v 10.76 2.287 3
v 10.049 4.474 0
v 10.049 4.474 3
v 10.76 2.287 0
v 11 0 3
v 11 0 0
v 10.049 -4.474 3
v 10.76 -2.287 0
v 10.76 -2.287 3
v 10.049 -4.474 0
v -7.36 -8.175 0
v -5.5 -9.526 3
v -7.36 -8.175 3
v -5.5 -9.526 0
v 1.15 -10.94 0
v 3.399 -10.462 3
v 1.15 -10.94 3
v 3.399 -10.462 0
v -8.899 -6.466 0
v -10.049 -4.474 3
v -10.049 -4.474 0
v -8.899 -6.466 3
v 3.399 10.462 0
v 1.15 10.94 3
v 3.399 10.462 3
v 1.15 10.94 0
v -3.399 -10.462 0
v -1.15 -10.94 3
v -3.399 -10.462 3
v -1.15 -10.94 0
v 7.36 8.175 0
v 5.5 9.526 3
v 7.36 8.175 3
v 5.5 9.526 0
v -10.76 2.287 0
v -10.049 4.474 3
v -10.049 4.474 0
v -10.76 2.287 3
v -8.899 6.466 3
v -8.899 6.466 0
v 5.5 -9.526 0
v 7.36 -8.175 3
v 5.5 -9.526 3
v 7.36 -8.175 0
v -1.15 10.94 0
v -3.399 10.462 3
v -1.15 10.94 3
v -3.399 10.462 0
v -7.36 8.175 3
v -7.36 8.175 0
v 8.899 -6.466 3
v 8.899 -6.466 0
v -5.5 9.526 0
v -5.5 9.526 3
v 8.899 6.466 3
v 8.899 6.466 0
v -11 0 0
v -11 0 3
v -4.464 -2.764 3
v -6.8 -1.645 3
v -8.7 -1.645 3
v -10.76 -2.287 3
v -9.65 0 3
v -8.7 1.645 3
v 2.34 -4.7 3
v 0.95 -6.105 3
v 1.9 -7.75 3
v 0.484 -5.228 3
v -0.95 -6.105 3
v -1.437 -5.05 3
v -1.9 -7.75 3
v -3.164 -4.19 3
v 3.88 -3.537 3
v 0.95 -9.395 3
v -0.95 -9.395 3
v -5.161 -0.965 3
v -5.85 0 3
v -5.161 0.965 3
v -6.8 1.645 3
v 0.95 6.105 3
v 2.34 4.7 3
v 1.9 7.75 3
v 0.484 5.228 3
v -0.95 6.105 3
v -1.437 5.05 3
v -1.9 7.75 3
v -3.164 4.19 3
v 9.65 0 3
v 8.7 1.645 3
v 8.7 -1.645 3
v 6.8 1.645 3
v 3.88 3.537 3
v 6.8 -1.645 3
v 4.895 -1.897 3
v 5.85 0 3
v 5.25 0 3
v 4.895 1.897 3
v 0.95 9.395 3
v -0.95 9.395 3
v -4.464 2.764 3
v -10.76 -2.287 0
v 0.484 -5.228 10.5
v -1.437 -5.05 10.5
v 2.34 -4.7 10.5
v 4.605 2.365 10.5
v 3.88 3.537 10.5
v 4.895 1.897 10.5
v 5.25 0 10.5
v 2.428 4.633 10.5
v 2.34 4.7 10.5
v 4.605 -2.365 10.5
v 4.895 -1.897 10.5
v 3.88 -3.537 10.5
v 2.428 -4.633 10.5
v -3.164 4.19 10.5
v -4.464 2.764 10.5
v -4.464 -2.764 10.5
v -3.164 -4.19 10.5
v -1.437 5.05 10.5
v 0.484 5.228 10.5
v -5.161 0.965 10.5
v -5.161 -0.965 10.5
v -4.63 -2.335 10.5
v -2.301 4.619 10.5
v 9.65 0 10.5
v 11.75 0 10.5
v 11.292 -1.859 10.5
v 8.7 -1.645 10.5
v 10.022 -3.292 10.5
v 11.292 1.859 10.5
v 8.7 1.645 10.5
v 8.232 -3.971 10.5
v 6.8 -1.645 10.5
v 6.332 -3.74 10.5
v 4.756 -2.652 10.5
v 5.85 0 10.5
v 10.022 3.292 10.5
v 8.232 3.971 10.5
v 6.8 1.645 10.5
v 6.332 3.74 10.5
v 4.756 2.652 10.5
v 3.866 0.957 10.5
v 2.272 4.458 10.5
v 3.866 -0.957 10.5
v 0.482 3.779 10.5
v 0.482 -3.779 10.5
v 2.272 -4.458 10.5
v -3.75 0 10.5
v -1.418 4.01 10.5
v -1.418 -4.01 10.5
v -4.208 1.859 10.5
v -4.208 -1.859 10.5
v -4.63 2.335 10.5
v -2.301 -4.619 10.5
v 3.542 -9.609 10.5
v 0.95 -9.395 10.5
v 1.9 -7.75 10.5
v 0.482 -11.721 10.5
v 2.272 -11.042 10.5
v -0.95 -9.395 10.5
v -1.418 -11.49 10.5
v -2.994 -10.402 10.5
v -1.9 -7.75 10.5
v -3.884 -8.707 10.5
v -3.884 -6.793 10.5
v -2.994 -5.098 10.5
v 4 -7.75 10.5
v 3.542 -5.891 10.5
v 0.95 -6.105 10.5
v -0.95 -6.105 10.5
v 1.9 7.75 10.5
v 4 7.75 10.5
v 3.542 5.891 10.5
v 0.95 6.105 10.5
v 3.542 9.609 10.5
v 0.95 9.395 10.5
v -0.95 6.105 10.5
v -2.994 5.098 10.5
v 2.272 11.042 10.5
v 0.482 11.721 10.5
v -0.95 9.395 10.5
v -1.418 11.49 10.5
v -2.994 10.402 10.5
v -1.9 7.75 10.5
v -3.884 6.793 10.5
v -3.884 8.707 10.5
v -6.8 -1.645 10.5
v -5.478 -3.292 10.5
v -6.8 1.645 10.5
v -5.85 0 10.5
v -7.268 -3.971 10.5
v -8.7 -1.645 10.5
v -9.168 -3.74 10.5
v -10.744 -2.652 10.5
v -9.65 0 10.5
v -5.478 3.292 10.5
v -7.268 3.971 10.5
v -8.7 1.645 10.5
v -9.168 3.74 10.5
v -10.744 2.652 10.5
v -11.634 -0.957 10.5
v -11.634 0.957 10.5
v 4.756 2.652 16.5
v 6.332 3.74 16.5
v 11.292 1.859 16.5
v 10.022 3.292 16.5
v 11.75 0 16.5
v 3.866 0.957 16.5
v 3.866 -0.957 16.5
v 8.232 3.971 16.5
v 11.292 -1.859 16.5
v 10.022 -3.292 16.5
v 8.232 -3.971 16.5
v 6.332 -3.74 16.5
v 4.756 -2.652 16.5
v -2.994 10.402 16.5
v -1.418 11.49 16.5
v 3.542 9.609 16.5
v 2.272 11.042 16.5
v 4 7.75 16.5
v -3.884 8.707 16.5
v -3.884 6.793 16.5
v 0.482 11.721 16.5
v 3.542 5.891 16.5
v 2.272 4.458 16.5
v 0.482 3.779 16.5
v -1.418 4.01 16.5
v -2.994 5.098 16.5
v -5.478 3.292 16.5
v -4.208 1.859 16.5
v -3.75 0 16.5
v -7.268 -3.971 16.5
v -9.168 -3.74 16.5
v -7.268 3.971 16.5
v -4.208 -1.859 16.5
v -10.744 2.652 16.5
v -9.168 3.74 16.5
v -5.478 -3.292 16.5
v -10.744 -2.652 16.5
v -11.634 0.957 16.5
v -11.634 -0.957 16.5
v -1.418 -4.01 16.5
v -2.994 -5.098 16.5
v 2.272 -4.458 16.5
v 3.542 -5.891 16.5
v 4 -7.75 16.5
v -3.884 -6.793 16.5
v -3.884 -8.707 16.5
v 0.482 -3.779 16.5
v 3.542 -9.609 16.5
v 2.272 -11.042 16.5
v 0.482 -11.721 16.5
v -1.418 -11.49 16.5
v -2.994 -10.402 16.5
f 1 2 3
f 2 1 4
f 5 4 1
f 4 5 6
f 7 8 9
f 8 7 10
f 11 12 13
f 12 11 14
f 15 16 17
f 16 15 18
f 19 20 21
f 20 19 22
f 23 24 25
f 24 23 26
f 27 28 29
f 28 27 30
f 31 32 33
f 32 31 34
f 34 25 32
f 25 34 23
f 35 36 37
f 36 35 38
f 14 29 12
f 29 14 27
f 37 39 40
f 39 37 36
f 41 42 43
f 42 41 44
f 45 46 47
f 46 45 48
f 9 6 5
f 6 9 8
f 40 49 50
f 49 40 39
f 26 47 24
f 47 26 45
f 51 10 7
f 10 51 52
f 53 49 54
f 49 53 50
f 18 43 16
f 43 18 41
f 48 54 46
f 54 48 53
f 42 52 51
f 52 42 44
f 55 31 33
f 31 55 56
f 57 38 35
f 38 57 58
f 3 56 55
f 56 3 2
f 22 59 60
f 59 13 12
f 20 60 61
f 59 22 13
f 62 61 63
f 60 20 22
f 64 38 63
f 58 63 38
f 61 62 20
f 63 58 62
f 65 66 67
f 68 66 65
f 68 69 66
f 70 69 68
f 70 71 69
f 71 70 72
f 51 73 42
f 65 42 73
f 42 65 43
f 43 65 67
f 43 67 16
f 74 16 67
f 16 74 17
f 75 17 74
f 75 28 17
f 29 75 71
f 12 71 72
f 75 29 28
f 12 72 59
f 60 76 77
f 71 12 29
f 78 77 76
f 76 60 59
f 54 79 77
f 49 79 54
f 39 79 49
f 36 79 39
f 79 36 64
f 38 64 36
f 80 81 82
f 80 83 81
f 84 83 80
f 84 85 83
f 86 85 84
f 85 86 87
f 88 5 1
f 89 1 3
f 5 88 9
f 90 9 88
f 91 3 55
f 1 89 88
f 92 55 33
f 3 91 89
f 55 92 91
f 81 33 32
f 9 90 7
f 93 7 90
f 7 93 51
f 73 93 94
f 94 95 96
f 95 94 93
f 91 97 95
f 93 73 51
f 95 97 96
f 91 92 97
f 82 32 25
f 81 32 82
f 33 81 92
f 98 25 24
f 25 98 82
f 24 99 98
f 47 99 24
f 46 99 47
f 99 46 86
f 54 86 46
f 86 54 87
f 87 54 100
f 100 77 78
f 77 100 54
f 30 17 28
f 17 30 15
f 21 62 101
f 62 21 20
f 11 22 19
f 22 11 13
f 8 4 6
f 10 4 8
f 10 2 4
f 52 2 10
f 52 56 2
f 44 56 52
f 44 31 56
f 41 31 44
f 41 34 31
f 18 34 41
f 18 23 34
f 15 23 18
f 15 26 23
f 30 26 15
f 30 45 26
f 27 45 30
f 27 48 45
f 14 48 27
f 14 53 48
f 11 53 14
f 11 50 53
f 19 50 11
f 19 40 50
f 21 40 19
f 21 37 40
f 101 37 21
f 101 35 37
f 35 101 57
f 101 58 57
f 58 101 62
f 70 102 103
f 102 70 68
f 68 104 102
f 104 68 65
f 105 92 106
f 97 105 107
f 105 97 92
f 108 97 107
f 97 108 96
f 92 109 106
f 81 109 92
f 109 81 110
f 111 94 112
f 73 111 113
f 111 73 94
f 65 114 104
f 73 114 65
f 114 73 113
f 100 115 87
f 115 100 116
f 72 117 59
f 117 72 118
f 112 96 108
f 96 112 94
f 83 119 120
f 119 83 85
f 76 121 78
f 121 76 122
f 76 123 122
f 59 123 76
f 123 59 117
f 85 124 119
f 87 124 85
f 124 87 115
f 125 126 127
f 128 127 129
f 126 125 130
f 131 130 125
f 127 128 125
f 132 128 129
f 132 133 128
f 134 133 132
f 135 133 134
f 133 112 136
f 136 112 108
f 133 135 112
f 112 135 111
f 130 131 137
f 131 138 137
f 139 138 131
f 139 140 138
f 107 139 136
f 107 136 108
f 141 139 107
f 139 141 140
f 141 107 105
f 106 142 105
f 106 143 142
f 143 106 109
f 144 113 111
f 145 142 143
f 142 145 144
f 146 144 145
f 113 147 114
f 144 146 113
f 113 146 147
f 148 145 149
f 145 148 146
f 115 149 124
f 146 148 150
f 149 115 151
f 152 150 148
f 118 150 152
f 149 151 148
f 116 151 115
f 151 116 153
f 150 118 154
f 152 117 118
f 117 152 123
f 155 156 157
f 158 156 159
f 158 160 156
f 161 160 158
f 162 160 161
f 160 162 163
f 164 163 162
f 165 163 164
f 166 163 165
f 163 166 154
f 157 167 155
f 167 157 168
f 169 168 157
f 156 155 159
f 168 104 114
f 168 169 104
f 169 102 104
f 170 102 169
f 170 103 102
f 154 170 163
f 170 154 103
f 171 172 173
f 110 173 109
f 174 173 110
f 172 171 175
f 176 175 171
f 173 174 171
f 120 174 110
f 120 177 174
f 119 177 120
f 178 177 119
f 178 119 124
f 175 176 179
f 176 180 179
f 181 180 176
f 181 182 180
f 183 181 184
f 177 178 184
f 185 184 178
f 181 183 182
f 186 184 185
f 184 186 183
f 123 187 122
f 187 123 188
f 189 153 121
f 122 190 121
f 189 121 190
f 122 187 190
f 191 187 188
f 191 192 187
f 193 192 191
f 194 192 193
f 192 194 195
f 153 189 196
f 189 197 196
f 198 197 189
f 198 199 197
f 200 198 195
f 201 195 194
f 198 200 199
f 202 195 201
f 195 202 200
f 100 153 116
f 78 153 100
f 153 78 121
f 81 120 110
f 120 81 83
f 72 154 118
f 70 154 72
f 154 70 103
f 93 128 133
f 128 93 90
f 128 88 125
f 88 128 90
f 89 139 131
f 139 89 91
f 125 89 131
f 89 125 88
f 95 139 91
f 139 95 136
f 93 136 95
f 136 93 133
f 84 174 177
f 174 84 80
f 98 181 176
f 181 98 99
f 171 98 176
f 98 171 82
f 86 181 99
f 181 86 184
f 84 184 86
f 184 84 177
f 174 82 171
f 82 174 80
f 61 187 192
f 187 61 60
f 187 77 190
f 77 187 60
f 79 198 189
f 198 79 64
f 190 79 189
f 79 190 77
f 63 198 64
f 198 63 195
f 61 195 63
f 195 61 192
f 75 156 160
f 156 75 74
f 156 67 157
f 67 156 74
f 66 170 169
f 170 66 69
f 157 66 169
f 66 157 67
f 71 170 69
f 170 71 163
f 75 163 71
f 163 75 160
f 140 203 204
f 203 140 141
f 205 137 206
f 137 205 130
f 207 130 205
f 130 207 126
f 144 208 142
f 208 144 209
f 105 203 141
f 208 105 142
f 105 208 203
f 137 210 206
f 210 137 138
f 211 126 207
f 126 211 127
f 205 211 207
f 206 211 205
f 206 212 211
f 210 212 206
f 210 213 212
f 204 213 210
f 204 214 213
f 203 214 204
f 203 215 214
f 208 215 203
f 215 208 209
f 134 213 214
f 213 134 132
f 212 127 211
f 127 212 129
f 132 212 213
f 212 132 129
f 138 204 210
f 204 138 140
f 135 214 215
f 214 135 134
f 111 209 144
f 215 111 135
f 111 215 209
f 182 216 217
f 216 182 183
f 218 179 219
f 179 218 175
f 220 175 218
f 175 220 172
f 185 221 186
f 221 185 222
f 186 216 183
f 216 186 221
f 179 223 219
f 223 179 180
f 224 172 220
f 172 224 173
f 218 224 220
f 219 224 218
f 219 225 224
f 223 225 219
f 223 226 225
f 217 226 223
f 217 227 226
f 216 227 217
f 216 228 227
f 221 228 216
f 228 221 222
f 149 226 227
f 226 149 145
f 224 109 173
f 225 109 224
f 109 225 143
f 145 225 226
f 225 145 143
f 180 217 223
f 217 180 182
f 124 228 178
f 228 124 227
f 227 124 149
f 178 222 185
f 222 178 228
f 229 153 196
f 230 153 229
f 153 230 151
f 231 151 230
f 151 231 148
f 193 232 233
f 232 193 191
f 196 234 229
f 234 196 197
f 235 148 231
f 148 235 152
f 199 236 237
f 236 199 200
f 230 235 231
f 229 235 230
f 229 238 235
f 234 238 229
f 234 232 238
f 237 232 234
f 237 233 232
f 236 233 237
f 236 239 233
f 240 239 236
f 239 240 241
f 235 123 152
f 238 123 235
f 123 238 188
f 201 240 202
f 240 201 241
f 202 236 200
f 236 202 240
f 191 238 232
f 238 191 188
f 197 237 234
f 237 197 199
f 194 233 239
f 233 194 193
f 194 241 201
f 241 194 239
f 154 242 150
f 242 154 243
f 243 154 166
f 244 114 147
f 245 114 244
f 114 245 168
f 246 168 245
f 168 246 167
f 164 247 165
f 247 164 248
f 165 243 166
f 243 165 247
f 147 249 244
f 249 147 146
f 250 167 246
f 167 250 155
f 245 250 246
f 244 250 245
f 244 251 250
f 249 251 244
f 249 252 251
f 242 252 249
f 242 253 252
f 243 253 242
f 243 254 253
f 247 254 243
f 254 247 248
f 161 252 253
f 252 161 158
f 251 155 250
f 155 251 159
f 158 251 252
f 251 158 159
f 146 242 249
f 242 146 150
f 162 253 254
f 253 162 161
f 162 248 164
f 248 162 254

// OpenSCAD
// file: shared_variables.scad
// sled
sled_length = 29.5;
sled_width = 34.5;
sled_x_distance = 17.5;
sled_y_distance = 23.5;
sled_screw_hole_diameter = 4.8;
sled_screw_head_diameter = 8.5;
sled_screw_head_th = 3;

// nema 17 stepper motor
motor_width = 45;
motor_mount_height = 40;

// roundbar
axle_holder_width = 30;
axle_set_depth = 12;
roundbar_diameter = 8 + 0.45;
axle_mount_hole_center = (axle_holder_width - roundbar_diameter) / 4;
axle_fastener_height = 11;

// axle_bearing
bearing_diameter = 22.5;
bearing_thickness = 8;
bearing_mount_width = bearing_diameter + 16;

// traveler
traveler_nut_d = 10.5;
traveler_ring_d = 22;
traveler_ring_th = 3;
traveler_nut_length = 10.5;
traveler_screw_r = 15.5/2;
traveler_downset = 10;

// general
y_axle_distance = 30;
bottom_th = 8;
wall_th = 8;
sled_clearing_distance = 10 + 2;
motor_backset = 30;
axle_height = 20;
motor_mount_width = motor_width / 2 + y_axle_distance + axle_holder_width / 2;
m3_hole_d = 3.8;
// main file
include <shared_variables.scad>

traveler_negative();

module traveler_negative() {
    union() {
        cylinder(d = traveler_ring_d, h = traveler_ring_th);
        cylinder(d = traveler_nut_d, h = traveler_nut_length);
        translate([traveler_screw_r, 0, 0]) cylinder(d = m3_hole_d, h = 10.5);
        translate([0, traveler_screw_r, 0]) cylinder(d = m3_hole_d, h = 10.5);
        translate([-traveler_screw_r, 0, 0]) cylinder(d = m3_hole_d, h = 10.5);
        translate([0, -traveler_screw_r, 0]) cylinder(d = m3_hole_d, h = 10.5);
        translate([traveler_screw_r, 0, 10.5]) cylinder(d = 8, h = 6);
        translate([0, traveler_screw_r, 10.5]) cylinder(d = 8, h = 6);
        translate([-traveler_screw_r, 0, 10.5]) cylinder(d = 8, h = 6);
        translate([0, -traveler_screw_r, 10.5]) cylinder(d = 8, h = 6);
    }
}
